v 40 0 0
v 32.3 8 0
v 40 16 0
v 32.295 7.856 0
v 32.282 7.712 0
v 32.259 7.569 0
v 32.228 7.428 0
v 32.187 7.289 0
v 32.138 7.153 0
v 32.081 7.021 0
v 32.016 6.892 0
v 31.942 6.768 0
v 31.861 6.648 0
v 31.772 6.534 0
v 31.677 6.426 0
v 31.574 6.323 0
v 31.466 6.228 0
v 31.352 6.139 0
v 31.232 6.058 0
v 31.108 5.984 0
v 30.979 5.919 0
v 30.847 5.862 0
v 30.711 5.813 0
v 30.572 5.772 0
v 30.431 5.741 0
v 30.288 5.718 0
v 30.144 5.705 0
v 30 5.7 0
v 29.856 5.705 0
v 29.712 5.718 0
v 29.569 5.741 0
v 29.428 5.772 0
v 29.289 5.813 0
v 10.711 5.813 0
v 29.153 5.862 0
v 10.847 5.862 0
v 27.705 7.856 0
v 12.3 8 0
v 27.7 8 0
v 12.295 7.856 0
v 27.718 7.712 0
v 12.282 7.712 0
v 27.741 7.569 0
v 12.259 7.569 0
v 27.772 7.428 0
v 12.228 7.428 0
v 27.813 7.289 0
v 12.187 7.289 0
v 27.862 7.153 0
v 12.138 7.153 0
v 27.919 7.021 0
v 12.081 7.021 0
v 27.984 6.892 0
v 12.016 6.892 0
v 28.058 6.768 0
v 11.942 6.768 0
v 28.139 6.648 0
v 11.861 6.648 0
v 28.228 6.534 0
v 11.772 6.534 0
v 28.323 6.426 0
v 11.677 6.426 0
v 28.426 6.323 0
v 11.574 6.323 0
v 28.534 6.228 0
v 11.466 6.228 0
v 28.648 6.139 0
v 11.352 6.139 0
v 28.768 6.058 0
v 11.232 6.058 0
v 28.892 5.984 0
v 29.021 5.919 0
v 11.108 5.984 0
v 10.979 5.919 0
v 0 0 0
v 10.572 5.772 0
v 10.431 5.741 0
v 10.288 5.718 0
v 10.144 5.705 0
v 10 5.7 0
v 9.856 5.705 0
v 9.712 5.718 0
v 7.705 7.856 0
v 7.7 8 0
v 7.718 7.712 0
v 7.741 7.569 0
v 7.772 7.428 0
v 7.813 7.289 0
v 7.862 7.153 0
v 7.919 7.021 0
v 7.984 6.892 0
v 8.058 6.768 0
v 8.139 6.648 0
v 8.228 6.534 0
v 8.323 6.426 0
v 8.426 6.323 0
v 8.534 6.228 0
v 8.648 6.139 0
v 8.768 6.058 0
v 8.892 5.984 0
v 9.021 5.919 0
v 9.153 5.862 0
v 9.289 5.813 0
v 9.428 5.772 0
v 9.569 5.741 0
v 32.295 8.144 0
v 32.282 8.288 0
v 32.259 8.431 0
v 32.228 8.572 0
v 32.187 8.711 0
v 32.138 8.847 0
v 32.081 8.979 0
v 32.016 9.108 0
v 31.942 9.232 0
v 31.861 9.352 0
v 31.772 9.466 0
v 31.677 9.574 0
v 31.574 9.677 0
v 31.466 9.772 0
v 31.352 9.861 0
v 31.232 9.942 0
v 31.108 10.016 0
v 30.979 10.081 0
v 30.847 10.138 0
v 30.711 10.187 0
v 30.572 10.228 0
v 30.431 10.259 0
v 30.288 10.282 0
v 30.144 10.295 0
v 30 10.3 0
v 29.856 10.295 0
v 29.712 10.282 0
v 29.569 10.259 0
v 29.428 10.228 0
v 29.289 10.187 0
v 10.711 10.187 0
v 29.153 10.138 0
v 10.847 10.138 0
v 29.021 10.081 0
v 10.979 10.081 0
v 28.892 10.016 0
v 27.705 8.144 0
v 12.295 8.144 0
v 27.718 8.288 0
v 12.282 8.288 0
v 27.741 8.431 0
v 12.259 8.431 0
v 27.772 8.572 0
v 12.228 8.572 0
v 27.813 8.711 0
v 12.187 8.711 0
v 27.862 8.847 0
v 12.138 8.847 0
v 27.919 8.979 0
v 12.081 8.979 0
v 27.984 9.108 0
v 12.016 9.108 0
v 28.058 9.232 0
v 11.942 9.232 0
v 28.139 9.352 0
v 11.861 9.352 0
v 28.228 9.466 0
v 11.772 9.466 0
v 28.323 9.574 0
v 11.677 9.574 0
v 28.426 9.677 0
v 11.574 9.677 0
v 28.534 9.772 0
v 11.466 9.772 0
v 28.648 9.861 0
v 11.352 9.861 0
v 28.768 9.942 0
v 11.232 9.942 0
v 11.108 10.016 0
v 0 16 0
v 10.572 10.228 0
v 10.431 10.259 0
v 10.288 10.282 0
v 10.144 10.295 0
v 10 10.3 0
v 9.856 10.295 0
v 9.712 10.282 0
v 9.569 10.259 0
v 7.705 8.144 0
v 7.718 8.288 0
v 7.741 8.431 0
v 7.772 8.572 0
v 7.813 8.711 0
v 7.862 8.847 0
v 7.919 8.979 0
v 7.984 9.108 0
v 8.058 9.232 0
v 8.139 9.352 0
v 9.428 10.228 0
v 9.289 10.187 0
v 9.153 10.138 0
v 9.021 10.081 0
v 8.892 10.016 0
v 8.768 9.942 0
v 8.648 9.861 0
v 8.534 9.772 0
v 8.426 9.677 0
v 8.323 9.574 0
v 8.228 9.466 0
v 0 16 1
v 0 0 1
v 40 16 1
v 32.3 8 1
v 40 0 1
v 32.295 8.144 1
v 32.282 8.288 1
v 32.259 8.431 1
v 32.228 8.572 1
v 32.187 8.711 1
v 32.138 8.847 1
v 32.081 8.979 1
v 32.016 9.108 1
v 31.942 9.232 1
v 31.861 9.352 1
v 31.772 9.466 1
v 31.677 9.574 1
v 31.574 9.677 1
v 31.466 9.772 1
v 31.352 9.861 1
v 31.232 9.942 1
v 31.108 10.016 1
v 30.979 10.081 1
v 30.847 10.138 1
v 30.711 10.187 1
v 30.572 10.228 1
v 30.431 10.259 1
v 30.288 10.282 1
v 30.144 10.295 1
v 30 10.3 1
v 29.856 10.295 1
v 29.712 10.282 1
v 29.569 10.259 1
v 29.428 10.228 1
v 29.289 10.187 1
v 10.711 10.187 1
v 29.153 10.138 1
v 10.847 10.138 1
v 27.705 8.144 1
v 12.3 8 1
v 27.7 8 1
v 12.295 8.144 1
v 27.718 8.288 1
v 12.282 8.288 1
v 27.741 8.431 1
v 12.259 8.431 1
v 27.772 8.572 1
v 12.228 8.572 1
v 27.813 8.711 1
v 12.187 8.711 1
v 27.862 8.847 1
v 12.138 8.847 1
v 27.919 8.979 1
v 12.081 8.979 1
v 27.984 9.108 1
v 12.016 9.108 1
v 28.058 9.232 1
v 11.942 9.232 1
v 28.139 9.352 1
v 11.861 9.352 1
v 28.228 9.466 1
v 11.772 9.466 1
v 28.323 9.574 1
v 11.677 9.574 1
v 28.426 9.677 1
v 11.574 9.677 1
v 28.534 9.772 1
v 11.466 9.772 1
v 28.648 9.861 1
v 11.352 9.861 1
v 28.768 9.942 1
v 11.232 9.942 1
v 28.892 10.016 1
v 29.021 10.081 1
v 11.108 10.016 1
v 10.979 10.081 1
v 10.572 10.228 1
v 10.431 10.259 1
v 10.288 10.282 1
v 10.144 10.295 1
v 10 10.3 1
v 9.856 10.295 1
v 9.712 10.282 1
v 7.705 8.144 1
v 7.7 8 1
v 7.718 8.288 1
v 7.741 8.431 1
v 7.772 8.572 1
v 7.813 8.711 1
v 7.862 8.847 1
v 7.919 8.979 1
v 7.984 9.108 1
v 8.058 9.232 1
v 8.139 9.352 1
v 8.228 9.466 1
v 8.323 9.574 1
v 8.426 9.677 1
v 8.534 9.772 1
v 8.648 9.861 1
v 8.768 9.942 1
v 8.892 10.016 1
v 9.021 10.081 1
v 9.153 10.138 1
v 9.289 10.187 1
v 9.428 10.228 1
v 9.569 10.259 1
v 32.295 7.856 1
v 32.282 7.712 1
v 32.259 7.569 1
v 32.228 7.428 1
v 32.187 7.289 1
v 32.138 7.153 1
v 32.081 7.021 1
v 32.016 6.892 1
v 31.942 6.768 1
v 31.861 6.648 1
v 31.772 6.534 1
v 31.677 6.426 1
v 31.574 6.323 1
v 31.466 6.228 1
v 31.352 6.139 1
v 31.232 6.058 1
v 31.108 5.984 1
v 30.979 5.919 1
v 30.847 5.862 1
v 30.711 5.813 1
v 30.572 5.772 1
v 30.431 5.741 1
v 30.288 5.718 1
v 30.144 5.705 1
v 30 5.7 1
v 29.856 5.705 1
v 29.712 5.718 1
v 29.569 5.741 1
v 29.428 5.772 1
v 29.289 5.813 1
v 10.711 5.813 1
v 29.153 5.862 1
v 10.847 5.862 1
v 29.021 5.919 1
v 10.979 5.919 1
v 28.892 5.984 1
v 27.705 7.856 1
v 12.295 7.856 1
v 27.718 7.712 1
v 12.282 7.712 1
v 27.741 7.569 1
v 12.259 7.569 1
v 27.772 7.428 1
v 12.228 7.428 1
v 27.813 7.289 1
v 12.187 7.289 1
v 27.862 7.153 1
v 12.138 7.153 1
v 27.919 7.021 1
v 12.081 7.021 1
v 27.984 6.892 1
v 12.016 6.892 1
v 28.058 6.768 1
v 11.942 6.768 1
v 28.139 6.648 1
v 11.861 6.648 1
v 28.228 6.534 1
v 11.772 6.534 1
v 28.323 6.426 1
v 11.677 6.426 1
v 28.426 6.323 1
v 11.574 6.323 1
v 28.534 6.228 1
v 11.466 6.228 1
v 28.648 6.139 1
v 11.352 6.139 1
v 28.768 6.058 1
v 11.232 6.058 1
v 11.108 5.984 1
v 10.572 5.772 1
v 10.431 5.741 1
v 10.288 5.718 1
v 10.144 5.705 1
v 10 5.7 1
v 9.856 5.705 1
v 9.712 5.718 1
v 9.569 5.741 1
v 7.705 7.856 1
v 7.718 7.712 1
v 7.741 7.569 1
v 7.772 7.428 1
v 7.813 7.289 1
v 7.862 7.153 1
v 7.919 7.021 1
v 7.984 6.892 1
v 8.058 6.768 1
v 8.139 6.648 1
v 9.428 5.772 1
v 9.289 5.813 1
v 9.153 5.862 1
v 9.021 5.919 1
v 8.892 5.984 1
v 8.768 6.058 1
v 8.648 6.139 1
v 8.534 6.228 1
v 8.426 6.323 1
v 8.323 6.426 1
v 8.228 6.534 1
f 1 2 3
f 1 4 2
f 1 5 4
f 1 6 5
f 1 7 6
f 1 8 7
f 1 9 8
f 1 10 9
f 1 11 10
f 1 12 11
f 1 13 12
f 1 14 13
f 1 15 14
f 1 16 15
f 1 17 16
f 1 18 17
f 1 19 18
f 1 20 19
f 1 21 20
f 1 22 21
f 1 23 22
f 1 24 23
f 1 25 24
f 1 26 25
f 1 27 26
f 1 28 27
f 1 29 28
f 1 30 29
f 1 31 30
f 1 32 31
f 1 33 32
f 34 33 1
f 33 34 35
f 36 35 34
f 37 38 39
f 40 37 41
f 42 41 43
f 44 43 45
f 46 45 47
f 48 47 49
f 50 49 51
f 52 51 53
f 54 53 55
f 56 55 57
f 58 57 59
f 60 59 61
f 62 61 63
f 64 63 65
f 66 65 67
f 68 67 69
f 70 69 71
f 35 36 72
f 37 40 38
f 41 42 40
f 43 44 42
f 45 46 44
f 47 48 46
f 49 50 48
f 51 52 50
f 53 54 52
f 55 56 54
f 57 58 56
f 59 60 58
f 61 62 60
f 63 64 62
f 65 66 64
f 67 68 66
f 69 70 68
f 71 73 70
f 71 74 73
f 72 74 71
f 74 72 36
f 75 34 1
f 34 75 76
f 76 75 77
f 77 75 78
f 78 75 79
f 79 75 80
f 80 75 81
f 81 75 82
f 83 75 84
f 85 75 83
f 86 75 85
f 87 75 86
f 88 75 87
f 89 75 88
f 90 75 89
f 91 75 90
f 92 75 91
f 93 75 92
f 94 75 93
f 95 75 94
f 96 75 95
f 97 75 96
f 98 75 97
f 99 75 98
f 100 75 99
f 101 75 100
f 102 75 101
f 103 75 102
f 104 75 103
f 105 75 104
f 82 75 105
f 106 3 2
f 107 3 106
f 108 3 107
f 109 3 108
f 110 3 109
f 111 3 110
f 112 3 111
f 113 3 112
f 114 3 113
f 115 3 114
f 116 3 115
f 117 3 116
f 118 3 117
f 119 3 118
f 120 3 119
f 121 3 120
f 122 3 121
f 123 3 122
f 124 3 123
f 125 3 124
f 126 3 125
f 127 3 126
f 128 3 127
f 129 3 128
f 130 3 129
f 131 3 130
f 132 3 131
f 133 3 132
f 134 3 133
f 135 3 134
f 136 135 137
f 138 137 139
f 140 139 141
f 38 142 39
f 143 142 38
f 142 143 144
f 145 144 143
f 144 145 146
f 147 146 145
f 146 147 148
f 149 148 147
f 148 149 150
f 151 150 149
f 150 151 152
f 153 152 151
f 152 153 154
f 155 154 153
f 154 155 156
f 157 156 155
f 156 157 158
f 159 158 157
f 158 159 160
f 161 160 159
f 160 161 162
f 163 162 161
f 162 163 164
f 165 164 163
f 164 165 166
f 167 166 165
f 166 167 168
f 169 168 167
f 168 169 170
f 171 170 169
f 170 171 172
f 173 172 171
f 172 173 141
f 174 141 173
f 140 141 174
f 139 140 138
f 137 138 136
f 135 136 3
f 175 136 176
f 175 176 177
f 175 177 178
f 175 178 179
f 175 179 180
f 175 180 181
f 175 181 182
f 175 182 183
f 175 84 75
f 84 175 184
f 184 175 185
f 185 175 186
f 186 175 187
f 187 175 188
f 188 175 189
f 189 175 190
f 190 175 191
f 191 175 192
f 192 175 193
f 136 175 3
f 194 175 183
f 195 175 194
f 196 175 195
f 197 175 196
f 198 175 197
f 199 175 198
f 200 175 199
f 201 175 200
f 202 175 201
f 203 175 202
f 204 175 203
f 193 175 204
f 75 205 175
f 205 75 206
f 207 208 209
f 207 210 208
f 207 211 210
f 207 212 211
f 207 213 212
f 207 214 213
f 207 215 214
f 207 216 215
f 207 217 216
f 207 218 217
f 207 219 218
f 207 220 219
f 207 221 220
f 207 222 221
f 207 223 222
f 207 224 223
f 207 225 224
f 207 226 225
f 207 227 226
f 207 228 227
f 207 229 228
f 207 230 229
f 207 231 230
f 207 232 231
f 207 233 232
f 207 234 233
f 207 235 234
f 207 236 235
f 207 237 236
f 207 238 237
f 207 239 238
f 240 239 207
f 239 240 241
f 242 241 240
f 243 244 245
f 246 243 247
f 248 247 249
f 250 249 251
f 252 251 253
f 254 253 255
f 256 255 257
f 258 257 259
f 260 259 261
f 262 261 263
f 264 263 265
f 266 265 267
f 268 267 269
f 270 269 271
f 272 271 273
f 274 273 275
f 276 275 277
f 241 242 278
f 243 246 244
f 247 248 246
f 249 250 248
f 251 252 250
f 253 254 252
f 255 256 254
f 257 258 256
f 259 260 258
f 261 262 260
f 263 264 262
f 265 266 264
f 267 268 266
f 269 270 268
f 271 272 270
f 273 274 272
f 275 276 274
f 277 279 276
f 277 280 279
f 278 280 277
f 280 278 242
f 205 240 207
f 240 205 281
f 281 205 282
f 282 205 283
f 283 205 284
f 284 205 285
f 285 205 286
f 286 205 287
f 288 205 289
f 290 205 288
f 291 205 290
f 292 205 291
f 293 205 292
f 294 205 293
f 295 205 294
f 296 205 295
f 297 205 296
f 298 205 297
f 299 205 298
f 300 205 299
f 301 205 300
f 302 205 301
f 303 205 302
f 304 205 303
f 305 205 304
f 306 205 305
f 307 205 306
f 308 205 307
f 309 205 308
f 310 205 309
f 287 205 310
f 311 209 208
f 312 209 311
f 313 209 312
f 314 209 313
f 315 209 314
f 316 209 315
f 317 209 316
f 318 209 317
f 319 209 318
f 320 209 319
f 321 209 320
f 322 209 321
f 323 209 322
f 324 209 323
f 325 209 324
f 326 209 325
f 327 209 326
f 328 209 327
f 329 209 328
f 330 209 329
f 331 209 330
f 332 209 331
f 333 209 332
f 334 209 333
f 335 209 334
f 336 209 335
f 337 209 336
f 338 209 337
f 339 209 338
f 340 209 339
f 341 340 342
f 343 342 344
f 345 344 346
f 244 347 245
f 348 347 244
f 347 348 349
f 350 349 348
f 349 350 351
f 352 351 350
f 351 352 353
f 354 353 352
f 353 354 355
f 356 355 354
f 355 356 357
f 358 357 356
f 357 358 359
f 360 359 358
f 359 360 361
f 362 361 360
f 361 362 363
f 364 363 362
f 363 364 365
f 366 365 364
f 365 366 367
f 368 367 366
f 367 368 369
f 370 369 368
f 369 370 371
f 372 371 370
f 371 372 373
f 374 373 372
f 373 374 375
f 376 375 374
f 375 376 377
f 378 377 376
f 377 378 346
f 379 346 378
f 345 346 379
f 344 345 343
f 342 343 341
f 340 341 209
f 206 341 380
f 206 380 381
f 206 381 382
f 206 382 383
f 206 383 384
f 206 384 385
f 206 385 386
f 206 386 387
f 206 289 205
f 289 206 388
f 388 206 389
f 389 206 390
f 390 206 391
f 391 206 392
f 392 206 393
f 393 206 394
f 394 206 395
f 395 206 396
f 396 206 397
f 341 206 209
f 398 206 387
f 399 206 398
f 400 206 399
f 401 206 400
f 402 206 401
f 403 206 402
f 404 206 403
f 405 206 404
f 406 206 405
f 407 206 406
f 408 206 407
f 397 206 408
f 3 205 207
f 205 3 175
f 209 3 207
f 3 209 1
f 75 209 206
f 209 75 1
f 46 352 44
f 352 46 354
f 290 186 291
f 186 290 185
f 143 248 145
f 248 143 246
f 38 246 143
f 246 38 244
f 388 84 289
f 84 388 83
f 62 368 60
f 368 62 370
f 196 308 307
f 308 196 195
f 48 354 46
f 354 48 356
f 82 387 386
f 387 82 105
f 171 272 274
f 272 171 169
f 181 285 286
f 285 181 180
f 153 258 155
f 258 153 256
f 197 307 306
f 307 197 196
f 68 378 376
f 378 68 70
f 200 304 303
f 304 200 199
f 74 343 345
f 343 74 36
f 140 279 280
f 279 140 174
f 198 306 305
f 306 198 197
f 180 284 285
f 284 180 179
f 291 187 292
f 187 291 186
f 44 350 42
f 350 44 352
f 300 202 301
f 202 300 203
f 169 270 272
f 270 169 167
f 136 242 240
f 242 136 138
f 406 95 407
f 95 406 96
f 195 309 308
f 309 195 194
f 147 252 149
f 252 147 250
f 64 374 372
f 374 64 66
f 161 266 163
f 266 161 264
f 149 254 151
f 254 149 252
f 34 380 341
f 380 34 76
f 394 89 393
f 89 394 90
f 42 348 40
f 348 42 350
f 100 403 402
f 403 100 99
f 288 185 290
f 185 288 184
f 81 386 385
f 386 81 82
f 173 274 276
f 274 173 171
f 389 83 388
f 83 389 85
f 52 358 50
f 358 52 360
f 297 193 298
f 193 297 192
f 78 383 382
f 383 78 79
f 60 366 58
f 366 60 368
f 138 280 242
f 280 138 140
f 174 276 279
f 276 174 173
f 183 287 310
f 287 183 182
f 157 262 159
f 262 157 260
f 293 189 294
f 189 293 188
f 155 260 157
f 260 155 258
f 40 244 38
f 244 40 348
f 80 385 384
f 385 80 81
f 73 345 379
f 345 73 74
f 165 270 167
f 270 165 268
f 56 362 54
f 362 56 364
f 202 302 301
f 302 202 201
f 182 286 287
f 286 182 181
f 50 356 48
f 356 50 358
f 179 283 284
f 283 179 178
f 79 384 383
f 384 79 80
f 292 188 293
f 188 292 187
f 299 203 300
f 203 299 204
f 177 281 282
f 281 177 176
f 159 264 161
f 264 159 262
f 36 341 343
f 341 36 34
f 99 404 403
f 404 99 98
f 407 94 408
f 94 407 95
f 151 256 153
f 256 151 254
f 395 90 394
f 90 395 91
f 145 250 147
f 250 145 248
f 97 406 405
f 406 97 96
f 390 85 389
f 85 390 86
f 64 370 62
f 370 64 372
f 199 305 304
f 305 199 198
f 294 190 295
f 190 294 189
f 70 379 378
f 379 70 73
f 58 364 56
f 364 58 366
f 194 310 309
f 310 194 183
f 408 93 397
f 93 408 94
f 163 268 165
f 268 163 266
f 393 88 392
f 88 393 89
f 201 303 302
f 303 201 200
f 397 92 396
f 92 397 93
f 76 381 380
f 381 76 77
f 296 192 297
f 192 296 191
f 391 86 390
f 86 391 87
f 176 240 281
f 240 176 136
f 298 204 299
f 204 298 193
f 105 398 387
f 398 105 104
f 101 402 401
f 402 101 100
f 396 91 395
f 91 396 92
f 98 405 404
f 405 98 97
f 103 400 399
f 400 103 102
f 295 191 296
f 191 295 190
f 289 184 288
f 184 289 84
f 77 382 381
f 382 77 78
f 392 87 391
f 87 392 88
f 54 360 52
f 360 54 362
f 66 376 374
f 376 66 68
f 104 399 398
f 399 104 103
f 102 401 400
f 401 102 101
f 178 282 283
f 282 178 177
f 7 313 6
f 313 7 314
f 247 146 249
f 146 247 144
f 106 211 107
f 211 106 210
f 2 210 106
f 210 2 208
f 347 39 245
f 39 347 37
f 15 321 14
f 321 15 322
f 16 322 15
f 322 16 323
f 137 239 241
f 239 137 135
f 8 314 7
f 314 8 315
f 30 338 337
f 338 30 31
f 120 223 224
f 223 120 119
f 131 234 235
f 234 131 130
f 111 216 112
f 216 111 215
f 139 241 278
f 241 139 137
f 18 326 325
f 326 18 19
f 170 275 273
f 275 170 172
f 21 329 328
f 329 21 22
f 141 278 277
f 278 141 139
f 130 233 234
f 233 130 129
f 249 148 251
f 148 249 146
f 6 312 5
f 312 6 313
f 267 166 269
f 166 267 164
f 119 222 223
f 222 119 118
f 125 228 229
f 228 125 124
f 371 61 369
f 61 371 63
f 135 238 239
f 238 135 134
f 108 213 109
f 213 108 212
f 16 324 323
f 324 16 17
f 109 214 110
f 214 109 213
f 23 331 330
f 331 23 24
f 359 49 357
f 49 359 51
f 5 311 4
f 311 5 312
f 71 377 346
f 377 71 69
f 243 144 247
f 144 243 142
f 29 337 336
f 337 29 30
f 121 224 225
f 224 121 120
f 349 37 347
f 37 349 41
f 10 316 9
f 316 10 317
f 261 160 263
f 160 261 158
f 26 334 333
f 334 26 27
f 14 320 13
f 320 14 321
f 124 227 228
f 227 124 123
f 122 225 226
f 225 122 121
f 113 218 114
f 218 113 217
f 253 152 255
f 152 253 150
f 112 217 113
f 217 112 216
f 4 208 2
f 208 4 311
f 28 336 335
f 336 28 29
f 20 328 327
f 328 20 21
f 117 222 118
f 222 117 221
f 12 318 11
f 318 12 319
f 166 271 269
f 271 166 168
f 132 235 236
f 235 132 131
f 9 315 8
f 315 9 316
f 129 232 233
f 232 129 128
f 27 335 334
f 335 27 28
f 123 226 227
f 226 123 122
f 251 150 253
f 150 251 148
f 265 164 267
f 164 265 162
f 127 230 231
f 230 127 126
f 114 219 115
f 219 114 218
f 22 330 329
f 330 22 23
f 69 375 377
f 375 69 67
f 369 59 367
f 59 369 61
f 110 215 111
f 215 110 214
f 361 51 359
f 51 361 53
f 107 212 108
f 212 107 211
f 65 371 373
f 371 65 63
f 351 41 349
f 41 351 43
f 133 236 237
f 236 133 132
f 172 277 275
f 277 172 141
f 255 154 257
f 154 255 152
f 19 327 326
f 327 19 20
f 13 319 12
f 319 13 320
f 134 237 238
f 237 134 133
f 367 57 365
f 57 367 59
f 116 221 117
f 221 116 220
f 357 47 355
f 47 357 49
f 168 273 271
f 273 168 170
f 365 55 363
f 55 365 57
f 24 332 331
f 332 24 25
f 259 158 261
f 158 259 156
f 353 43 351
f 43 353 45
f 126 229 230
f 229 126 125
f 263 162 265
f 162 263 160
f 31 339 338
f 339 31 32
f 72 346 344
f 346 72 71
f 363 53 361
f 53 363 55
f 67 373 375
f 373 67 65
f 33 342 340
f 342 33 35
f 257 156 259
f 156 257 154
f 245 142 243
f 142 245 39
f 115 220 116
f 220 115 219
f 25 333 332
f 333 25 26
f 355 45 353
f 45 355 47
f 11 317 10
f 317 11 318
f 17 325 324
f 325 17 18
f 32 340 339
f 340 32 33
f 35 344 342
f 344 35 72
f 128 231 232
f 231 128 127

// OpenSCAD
bolt_hole_diameter = 4.6; // [4.0:0.1:5]
z_spacer_thickness = 1.0; // [1:0.1:10]

/* [Hidden] */

$fn = 100;

x1 = 40;
y1 = 16;

d2 = bolt_hole_diameter;

h1 = z_spacer_thickness; 



difference() {
	linear_extrude(height=h1) square([x1,y1]);
	
	translate([x1/4,y1/2,-0.1]) cylinder(h=h1+1,d=d2);
	translate([x1/4*3,y1/2,-0.1]) cylinder(h=h1+1,d=d2);

}
